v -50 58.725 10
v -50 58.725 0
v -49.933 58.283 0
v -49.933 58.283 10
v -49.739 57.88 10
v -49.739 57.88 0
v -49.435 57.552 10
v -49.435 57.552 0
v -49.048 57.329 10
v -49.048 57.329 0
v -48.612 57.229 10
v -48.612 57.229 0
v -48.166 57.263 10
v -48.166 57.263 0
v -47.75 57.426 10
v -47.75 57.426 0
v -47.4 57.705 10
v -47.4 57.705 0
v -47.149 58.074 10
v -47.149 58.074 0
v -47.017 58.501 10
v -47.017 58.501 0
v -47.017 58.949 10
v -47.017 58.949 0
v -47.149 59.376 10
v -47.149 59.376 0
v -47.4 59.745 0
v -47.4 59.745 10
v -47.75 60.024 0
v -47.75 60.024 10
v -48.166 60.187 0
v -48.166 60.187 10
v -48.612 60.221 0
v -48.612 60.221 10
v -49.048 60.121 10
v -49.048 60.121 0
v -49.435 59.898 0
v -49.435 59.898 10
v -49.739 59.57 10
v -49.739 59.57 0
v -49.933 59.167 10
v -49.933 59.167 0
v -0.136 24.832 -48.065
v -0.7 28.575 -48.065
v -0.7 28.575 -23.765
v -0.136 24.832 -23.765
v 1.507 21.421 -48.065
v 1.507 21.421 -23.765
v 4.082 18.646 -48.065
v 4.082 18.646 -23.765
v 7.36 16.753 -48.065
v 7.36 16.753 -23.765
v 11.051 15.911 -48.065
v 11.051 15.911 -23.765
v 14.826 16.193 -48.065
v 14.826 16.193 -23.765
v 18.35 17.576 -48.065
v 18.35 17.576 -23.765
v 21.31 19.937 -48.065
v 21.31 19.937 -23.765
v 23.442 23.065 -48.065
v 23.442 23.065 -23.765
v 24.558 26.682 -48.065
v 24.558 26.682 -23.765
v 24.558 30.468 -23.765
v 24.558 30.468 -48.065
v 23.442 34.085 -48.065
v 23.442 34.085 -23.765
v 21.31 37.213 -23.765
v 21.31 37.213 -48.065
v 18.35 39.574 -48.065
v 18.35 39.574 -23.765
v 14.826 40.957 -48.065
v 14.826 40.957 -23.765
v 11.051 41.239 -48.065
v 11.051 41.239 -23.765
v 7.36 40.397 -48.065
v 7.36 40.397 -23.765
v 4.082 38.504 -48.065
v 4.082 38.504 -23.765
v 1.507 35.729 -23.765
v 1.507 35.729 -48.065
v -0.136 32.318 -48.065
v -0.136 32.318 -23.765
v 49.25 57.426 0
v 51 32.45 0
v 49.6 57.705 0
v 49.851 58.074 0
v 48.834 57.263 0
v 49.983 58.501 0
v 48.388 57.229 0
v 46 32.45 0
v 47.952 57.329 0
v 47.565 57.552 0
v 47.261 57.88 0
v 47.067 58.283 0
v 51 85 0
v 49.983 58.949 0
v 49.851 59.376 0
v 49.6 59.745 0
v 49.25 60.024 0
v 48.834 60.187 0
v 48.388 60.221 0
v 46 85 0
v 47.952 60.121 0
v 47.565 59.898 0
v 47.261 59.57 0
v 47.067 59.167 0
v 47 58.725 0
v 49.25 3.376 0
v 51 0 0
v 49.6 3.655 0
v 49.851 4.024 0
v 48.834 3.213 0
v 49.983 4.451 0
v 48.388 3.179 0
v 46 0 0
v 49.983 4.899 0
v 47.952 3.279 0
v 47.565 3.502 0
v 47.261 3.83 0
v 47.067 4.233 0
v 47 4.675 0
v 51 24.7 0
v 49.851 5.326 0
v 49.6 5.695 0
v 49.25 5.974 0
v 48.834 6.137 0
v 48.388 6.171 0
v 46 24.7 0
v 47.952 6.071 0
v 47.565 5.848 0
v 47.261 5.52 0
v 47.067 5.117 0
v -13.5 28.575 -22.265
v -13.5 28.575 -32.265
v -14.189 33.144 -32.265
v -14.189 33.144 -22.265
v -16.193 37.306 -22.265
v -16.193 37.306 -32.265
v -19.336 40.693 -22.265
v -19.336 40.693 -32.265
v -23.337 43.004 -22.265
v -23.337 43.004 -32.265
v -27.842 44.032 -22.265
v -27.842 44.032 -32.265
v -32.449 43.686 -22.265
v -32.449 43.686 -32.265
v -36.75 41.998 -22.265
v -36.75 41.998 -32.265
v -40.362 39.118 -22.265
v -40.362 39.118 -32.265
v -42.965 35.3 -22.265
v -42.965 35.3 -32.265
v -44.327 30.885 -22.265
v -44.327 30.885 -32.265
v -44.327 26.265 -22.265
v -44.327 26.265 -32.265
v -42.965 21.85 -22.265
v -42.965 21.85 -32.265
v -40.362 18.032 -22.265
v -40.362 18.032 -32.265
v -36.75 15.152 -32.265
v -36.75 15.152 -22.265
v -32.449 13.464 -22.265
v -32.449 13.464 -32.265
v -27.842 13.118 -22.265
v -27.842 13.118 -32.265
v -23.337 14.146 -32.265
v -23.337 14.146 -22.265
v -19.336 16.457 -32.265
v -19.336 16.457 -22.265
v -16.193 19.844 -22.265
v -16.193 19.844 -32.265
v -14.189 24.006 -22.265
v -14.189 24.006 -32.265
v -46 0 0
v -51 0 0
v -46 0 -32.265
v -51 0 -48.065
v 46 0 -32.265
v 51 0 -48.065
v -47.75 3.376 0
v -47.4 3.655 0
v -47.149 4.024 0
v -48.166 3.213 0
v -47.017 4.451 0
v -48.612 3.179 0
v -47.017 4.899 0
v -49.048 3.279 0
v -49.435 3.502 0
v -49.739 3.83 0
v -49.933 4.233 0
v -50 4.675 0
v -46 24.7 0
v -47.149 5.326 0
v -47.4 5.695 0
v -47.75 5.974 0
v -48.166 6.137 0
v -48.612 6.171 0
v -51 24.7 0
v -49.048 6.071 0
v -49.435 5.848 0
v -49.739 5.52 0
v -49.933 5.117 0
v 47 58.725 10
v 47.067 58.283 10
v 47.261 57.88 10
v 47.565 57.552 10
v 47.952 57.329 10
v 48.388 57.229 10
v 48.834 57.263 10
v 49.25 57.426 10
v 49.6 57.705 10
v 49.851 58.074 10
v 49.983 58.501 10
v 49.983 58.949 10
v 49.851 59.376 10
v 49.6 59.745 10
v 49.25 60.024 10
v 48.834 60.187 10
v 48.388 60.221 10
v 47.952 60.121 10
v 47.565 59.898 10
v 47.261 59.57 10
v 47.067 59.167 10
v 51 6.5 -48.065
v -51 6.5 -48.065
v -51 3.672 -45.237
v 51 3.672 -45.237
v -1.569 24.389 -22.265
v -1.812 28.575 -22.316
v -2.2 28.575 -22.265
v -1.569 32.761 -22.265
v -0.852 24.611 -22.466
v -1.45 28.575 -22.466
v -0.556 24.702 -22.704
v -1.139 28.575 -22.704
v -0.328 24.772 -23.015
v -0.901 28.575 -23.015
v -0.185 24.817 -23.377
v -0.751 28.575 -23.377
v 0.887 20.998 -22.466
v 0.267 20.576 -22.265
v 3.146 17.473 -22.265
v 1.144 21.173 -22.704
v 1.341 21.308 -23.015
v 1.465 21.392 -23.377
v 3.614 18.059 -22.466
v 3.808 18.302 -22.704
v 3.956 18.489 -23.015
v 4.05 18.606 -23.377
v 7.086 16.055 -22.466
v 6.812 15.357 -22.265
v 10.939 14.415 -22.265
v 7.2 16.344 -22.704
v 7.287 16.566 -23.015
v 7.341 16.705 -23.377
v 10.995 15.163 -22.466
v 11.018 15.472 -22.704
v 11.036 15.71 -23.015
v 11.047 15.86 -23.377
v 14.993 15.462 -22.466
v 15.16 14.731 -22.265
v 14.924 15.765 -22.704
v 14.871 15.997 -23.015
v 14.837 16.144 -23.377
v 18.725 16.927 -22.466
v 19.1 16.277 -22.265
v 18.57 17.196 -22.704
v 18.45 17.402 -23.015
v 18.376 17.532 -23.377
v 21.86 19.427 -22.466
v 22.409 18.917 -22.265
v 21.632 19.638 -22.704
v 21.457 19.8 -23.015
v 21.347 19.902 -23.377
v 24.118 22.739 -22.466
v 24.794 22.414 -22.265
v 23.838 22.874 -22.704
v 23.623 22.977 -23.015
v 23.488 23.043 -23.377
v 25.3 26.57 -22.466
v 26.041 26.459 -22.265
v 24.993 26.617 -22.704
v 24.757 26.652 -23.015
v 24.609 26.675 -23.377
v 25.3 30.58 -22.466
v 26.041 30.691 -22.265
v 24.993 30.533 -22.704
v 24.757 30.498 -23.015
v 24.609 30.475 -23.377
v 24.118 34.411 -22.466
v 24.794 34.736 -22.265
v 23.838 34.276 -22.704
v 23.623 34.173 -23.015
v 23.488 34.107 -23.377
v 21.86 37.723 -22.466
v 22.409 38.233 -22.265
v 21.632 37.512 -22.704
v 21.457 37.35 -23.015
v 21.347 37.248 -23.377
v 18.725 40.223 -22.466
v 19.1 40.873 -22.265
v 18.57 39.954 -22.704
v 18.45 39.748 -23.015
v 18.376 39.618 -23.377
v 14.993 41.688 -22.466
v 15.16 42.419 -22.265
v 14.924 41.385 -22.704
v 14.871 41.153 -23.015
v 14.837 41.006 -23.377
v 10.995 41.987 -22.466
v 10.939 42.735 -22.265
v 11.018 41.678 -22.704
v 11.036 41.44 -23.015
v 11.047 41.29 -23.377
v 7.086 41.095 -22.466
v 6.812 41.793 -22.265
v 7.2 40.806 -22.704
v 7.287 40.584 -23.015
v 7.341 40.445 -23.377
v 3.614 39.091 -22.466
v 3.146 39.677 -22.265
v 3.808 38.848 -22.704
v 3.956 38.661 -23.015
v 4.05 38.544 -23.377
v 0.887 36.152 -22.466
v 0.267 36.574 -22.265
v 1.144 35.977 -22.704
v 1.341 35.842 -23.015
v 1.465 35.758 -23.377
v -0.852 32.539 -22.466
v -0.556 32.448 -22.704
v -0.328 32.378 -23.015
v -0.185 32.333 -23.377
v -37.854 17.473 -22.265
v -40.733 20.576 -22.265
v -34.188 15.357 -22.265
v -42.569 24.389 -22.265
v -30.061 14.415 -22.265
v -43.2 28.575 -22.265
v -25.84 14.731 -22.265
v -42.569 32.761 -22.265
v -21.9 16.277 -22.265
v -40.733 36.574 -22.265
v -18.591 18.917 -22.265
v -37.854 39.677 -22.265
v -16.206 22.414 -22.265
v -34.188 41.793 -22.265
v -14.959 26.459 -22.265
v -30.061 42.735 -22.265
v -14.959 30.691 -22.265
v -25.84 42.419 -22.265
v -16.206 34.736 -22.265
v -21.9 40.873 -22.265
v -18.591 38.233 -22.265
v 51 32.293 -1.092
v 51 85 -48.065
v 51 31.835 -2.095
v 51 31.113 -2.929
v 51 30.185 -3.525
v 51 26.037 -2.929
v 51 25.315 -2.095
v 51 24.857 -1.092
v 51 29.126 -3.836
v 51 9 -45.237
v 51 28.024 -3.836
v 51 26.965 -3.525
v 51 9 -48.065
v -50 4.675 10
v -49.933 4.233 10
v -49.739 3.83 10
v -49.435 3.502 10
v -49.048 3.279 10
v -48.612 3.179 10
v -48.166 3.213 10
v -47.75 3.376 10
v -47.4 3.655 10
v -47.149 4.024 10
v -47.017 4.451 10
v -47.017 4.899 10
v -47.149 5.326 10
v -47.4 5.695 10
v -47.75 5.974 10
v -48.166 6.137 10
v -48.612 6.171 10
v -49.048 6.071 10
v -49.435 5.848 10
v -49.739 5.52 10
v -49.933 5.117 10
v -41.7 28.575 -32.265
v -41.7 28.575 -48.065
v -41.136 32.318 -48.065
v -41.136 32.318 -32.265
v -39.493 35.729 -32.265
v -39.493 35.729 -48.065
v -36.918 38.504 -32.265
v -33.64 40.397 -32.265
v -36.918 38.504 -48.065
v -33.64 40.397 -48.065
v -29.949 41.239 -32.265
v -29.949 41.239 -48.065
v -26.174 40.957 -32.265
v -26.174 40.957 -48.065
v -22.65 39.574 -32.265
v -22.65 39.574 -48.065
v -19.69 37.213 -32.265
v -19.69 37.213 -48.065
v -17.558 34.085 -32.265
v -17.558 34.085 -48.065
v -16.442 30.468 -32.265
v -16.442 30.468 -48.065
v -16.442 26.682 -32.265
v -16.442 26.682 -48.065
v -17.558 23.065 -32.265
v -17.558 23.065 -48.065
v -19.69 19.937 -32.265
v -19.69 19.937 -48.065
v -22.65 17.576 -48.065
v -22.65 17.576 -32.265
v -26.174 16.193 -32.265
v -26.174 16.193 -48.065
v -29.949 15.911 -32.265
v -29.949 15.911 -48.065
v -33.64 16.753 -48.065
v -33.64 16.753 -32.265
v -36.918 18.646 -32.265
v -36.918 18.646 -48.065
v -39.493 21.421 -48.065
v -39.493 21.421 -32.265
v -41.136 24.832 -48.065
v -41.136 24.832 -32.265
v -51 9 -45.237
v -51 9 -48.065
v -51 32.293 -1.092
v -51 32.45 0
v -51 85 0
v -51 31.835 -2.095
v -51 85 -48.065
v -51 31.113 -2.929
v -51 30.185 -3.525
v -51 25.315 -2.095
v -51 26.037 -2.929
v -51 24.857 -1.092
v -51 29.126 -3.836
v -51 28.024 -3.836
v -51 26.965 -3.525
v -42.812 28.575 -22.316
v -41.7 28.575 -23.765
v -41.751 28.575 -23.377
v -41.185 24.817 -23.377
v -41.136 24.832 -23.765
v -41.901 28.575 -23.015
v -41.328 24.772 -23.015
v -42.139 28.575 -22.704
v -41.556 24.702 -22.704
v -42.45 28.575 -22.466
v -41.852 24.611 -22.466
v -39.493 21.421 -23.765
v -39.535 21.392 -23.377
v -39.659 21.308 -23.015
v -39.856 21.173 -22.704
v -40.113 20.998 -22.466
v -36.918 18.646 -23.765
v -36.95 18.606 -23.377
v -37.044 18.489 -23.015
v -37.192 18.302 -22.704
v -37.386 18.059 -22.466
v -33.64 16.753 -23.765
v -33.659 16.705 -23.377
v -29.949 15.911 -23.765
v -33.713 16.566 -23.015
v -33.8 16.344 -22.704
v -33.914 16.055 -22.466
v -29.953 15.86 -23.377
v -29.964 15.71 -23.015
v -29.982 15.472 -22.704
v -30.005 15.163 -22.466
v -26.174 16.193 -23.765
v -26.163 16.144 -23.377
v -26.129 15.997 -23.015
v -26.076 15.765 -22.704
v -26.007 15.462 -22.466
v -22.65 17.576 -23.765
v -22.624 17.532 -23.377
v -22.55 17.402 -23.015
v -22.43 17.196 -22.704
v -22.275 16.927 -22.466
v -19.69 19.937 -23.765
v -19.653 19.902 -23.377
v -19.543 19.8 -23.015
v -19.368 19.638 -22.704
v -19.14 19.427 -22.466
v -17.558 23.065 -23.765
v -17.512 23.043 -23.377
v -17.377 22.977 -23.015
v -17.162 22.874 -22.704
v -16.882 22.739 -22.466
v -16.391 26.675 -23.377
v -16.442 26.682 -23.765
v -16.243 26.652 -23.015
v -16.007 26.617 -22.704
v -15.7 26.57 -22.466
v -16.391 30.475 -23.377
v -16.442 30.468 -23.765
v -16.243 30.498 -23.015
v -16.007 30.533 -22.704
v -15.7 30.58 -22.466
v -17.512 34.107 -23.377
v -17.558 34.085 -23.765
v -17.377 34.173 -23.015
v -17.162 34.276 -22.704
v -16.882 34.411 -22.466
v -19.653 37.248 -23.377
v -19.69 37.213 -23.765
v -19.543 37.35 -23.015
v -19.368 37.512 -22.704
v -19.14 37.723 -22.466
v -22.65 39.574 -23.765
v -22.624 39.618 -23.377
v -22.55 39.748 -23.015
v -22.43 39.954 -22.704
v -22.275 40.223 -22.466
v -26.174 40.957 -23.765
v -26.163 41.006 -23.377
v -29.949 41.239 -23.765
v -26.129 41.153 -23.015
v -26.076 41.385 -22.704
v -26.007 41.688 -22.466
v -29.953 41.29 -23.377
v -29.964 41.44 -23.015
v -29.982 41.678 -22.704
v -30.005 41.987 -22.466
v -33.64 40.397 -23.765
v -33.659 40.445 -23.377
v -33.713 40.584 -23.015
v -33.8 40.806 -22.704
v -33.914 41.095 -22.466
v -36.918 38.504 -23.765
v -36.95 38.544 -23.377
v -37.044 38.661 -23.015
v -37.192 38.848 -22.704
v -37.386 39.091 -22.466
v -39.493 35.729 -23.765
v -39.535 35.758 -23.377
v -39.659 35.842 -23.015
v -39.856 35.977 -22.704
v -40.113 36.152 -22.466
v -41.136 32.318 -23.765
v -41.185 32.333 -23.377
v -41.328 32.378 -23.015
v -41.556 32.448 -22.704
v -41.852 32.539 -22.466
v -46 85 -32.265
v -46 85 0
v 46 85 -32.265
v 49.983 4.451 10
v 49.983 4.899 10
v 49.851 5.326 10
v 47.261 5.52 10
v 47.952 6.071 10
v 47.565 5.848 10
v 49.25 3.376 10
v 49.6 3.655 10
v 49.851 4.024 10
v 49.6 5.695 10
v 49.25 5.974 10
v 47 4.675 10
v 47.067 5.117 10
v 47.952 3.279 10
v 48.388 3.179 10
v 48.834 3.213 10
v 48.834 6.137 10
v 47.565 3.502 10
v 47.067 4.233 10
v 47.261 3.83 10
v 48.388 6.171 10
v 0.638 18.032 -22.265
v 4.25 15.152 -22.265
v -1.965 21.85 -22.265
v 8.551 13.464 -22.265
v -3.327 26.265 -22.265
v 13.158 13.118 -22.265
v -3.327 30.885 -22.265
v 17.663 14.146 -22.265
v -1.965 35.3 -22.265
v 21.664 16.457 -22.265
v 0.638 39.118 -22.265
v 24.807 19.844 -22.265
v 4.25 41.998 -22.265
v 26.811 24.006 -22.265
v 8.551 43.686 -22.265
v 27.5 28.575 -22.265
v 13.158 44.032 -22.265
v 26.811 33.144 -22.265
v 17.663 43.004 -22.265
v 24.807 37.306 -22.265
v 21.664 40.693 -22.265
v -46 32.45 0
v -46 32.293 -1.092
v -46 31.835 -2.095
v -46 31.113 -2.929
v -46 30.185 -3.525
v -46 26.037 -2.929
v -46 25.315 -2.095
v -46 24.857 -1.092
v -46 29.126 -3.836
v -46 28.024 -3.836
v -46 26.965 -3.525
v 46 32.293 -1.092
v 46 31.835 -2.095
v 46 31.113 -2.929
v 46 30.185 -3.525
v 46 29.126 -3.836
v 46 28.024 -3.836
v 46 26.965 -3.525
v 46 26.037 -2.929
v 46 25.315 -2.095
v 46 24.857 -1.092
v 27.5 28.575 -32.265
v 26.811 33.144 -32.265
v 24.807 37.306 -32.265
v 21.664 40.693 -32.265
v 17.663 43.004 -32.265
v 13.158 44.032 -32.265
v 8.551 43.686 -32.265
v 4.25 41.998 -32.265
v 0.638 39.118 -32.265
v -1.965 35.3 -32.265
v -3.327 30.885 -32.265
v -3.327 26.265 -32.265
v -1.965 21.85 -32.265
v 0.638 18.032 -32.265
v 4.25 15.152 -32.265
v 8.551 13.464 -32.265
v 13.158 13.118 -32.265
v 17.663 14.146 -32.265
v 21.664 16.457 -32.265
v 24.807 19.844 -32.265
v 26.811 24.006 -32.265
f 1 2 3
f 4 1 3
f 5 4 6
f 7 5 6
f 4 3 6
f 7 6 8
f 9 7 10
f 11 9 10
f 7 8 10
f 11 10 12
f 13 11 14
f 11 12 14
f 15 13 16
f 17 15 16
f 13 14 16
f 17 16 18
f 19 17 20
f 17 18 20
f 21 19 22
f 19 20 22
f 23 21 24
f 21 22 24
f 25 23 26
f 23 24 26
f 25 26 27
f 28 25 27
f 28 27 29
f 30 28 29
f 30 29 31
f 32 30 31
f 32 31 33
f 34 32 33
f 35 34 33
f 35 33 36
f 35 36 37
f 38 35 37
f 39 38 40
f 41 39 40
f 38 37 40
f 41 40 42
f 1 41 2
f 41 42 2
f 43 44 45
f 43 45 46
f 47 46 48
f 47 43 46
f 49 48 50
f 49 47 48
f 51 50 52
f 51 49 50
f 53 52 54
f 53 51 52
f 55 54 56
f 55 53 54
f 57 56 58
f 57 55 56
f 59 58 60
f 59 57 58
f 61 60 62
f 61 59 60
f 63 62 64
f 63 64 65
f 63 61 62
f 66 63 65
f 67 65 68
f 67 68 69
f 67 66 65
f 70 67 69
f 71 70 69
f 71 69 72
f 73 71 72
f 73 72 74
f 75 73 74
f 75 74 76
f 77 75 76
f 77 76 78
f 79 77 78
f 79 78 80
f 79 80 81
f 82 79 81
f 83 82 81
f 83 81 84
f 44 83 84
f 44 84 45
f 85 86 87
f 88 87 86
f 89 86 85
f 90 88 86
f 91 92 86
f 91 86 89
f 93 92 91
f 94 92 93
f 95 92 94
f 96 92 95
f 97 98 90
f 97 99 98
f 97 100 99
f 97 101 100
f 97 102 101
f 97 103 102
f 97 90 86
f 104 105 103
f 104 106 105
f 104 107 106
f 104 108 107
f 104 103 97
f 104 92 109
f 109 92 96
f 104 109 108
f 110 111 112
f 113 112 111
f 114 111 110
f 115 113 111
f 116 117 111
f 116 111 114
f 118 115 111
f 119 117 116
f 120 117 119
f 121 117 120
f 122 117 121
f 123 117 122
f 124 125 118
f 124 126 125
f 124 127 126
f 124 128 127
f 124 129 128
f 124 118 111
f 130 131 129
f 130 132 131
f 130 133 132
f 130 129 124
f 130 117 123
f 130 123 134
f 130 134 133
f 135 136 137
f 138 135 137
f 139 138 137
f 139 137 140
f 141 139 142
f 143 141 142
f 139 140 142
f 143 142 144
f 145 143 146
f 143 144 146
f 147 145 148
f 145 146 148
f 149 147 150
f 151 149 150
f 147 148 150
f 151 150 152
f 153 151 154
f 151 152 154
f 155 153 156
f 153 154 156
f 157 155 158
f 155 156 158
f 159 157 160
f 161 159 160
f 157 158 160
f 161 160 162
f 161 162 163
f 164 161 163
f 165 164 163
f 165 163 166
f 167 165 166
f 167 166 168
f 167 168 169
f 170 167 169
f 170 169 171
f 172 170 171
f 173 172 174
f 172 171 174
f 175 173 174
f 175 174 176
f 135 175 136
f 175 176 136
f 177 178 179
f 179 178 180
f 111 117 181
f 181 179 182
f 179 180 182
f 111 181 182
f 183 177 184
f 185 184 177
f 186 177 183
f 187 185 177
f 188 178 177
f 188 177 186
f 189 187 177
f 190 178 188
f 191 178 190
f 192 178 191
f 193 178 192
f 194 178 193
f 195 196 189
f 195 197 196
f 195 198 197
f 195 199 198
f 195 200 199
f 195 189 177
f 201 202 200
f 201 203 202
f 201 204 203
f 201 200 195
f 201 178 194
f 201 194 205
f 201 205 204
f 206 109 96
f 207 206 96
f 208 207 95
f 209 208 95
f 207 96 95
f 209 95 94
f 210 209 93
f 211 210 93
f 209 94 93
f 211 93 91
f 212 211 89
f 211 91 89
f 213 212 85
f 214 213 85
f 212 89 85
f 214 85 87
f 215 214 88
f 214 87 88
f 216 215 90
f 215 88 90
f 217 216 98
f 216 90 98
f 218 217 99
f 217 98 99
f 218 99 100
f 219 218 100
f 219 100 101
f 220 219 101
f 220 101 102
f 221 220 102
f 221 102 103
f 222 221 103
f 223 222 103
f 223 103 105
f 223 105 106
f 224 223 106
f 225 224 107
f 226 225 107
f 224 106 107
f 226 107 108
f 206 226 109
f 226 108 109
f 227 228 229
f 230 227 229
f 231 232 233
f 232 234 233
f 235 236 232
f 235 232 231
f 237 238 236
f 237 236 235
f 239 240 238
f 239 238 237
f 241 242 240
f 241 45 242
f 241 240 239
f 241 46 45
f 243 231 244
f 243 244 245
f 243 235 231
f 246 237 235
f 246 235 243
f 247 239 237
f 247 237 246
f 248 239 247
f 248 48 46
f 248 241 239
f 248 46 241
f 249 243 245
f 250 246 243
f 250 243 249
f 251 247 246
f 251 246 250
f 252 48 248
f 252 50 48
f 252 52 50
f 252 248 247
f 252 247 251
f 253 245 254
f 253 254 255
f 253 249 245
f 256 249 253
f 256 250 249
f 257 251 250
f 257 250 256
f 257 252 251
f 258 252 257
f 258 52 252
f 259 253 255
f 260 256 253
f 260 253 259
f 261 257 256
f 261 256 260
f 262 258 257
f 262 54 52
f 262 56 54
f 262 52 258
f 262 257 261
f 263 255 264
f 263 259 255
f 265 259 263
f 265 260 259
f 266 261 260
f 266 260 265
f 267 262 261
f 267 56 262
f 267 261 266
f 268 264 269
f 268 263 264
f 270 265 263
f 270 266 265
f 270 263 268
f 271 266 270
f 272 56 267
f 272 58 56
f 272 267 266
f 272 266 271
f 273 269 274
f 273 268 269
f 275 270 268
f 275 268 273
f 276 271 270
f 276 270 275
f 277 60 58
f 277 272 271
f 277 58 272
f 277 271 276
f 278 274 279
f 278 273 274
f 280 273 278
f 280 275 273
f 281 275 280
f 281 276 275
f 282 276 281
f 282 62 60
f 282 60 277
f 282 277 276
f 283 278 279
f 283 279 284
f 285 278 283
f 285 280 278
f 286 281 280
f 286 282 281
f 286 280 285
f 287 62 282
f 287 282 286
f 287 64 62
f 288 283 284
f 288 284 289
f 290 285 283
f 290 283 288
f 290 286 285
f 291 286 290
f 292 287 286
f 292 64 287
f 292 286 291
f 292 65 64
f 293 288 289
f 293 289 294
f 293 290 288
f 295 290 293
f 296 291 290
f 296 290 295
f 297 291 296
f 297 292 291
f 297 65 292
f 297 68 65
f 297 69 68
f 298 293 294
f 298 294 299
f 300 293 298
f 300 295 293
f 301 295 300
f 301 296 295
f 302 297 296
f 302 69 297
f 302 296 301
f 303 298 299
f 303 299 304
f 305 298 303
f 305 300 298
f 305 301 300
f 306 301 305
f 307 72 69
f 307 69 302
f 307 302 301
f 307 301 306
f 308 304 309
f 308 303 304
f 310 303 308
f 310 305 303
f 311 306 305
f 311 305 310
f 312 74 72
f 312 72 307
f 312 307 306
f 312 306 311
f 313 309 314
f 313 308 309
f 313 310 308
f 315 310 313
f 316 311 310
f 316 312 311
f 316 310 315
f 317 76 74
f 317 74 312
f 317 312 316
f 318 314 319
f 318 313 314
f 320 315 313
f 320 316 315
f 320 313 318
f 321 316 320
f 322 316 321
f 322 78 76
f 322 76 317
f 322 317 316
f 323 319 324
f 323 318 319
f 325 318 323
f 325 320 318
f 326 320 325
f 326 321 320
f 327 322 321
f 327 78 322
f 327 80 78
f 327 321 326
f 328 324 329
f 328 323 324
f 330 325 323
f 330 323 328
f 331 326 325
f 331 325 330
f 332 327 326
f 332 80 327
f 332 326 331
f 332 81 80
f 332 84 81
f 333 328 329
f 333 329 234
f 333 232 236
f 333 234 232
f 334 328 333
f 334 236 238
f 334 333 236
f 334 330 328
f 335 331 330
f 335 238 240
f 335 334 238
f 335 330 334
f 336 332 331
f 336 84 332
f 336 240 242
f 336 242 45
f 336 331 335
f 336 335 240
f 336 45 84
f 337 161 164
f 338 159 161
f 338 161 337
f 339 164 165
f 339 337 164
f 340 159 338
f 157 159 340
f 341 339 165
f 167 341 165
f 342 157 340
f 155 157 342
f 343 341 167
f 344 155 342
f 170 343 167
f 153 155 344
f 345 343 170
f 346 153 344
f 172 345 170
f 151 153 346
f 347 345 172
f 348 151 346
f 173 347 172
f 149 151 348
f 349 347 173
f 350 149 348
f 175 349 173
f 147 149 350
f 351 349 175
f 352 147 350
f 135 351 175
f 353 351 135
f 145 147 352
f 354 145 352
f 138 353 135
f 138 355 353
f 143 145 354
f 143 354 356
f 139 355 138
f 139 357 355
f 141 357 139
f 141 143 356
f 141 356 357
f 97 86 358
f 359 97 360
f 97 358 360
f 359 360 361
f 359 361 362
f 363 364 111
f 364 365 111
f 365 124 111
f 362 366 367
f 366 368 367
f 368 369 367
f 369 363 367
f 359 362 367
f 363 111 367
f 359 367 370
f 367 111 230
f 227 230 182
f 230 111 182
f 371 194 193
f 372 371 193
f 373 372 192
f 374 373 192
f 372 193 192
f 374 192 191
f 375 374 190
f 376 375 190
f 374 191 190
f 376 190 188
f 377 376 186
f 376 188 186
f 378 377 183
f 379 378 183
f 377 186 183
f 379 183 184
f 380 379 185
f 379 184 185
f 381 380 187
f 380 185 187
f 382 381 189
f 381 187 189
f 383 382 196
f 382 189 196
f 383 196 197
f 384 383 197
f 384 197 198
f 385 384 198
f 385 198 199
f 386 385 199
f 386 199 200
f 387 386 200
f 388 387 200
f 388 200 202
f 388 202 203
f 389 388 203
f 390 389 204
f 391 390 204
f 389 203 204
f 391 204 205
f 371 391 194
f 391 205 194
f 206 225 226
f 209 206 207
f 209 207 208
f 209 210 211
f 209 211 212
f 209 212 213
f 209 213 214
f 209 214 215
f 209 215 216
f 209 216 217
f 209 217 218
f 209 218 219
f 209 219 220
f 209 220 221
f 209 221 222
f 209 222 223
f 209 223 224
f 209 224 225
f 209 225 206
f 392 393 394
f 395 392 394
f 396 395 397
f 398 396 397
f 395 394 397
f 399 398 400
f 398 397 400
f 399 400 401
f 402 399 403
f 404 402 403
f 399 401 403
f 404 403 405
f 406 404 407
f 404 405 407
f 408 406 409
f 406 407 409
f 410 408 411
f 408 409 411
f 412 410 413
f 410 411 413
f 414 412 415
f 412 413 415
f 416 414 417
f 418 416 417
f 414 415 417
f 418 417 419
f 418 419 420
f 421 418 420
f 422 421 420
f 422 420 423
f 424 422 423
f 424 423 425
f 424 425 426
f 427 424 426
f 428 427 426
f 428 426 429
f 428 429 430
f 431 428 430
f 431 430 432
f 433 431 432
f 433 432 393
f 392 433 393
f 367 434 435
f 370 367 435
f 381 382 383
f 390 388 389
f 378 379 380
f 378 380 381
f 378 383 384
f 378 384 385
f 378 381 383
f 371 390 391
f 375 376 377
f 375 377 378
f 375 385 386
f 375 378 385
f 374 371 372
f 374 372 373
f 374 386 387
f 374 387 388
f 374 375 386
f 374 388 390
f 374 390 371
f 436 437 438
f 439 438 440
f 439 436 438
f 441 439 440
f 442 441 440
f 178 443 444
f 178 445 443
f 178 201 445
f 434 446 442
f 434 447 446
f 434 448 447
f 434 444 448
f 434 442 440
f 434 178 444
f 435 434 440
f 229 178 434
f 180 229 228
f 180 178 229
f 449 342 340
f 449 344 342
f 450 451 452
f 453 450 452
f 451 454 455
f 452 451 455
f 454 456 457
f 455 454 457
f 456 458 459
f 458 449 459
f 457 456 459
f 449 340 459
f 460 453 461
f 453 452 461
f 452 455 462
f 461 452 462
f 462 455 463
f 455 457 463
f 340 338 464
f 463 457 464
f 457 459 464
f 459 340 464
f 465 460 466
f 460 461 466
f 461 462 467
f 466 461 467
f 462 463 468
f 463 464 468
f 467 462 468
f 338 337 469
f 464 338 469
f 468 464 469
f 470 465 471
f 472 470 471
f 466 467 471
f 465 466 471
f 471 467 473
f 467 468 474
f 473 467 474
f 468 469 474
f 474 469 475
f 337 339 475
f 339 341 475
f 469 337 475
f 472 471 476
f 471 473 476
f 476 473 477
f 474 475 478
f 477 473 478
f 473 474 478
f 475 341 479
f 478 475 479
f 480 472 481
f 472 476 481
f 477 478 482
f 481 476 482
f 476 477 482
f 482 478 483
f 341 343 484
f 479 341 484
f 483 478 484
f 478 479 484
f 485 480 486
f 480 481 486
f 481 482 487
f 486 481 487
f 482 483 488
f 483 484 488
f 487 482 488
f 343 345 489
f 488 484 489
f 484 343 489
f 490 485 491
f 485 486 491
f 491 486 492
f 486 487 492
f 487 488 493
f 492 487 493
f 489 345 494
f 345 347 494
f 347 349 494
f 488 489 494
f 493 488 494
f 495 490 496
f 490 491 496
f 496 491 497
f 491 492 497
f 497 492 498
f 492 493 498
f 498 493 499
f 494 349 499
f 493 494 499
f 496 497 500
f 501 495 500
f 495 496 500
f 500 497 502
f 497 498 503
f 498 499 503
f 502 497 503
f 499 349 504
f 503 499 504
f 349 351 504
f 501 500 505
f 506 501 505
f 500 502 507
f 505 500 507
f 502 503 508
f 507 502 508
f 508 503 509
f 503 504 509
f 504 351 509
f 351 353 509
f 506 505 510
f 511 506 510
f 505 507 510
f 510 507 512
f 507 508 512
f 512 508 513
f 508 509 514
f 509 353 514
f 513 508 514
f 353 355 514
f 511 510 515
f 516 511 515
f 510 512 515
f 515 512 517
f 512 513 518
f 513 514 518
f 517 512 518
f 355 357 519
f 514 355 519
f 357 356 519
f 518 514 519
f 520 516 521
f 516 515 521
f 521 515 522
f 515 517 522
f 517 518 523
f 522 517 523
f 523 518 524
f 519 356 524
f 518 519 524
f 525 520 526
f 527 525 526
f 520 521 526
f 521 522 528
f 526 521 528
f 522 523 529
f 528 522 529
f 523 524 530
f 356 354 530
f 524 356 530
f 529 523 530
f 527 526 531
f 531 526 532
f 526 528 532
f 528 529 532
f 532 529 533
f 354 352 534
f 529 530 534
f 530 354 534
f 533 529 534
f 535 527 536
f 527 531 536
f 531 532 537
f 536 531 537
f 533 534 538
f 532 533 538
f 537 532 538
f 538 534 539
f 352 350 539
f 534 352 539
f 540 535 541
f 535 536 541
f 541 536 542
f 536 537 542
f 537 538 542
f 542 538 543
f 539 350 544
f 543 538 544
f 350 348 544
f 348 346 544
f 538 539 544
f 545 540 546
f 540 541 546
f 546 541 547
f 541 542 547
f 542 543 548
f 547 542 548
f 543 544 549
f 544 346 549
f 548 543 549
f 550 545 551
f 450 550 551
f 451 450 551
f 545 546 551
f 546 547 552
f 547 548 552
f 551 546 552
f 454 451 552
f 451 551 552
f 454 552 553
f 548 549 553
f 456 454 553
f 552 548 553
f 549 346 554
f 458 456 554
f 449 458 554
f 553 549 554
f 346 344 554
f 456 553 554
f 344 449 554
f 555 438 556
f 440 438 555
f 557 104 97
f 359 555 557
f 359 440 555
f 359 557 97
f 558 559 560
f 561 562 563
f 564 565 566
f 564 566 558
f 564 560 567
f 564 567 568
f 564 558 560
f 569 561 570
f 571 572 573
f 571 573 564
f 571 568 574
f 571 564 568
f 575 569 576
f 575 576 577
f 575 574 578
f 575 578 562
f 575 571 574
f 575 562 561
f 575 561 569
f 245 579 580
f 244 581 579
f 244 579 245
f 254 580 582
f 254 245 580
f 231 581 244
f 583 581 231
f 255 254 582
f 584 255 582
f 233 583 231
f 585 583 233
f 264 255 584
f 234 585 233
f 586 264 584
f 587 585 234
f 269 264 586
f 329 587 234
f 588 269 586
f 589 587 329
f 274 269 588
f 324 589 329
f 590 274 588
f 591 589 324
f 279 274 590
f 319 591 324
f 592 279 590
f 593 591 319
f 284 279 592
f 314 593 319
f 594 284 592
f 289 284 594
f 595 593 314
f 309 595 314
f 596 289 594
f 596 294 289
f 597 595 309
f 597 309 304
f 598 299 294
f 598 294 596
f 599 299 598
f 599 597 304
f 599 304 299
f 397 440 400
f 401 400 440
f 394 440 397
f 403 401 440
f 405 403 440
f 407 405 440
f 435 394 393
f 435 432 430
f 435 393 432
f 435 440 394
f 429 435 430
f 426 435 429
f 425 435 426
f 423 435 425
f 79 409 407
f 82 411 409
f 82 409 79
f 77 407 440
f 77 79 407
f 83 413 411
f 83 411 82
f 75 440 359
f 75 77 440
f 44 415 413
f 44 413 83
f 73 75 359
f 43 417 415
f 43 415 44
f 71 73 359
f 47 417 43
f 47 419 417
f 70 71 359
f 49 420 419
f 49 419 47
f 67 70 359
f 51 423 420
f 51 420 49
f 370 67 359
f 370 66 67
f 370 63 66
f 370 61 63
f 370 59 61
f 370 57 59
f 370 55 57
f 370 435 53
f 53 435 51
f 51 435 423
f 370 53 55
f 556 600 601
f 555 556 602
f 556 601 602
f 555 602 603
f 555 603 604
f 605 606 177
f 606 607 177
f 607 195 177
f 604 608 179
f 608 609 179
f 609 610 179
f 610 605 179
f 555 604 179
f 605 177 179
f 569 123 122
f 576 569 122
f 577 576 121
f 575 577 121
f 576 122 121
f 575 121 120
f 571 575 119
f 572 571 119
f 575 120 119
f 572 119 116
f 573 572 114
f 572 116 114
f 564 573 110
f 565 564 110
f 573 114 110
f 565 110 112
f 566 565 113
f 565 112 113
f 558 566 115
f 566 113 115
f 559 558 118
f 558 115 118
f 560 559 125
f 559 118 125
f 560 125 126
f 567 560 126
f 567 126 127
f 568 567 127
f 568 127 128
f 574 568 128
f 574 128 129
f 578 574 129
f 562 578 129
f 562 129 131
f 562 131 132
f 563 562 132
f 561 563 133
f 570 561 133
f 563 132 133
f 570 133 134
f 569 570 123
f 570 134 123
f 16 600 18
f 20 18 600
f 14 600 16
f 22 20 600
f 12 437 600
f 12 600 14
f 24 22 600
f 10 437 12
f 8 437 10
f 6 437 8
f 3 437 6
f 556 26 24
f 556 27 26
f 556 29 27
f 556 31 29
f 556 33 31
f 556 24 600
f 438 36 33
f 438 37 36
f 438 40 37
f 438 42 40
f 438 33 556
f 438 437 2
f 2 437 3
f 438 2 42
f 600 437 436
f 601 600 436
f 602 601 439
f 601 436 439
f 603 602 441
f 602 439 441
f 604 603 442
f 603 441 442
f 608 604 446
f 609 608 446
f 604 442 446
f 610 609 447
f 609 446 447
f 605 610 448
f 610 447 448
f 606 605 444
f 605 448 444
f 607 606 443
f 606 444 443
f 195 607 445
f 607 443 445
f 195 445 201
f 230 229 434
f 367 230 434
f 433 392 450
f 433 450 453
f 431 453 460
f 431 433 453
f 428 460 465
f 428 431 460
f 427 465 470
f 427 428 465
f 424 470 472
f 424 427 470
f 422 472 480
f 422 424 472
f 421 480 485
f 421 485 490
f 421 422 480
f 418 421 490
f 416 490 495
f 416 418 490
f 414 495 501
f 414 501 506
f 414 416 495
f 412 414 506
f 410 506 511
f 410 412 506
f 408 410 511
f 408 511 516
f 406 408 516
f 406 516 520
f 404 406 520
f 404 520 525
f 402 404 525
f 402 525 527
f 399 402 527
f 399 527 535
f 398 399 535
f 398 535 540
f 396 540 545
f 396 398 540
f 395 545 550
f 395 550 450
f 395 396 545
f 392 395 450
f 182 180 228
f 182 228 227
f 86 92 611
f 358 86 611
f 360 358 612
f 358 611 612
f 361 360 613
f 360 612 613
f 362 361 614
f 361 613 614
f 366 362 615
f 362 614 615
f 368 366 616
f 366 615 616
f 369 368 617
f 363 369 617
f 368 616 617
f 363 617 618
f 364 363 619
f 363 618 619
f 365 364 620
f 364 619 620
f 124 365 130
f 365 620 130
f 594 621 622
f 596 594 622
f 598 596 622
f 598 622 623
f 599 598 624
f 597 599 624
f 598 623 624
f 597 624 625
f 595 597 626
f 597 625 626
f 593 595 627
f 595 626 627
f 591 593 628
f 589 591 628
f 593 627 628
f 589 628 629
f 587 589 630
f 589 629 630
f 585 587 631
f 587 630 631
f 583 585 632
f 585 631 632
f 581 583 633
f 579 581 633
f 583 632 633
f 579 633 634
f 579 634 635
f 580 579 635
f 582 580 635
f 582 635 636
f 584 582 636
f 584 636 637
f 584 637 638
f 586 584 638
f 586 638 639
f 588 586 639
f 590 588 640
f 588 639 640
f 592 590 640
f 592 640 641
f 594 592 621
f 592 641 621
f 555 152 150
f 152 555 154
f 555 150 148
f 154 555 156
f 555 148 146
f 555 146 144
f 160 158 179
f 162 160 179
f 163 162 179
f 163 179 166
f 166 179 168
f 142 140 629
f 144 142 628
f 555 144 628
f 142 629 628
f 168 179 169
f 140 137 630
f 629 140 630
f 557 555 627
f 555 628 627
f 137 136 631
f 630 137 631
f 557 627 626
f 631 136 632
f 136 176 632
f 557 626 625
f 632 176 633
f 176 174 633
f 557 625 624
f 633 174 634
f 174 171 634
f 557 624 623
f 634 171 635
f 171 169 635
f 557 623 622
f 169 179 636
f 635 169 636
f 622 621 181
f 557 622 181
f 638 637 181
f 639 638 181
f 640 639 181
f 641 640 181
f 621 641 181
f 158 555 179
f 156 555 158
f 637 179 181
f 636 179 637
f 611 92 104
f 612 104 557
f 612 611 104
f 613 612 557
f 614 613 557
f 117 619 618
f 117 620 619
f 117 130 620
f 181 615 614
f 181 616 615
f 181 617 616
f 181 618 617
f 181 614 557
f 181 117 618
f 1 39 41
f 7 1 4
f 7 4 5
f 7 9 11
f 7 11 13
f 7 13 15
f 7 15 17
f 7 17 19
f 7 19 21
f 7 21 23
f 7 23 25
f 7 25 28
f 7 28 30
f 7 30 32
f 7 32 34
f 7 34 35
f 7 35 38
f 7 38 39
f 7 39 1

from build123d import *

# Parameters (mm, degrees)
SKETCH2_W           = 102
SKETCH2_H           = 96.13
SKETCH2_W_2         = 92
SKETCH2_H_2         = 64.53
BOSS_EXTRUDE1_DEPTH = 85
SKETCH8_R           = 10.25
CUT_EXTRUDE7_DEPTH  = 20
SKETCH9_R           = 12.7
CUT_EXTRUDE8_DEPTH  = 20
SKETCH10_R          = 3.875
CUT_EXTRUDE9_DEPTH  = 142.206388754
SKETCH11_W          = 48.065
SKETCH11_H          = 85
CUT_EXTRUDE10_DEPTH = 142.206388754
SKETCH14_R          = 1.5
BOSS_EXTRUDE2_DEPTH = 10
SKETCH15_R          = 15.5
SKETCH15_R_2        = 12.7
BOSS_EXTRUDE3_DEPTH = 10
FILLET1_R           = 1.5
CUT_EXTRUDE11_DEPTH = 142.206388754


with BuildPart() as part:
    # Sketch2 → Boss-Extrude1 (new body)
    with BuildSketch(Plane(origin=(0, 0, 0), x_dir=(1, 0, 0), z_dir=(0, 1, 0))):
        Rectangle(SKETCH2_W, SKETCH2_H)
        Rectangle(SKETCH2_W_2, SKETCH2_H_2, mode=Mode.SUBTRACT)
    extrude(amount=BOSS_EXTRUDE1_DEPTH)

    # Sketch8 → Cut-Extrude7 (cut)
    with BuildSketch(Plane.XY.offset(48.065)):
        with Locations((-31, 31.7)):
            Circle(SKETCH8_R)
        with Locations((29, 31.7)):
            Circle(SKETCH8_R)
    extrude(amount=-CUT_EXTRUDE7_DEPTH, mode=Mode.SUBTRACT)

    # Sketch9 → Cut-Extrude8 (cut)
    with BuildSketch(Plane(origin=(0, 0, -48.065), x_dir=(-1, 0, 0), z_dir=(0, 0, -1))):
        with Locations((-12, 28.575)):
            Circle(SKETCH9_R)
        with Locations((29, 28.575)):
            Circle(SKETCH9_R)
    extrude(amount=-CUT_EXTRUDE8_DEPTH, mode=Mode.SUBTRACT)

    # Sketch10 → Cut-Extrude9 (cut, through all)
    with BuildSketch(Plane.ZY.offset(51)):
        with Locations((0, 28.575)):
            Circle(SKETCH10_R)
    extrude(amount=-CUT_EXTRUDE9_DEPTH, mode=Mode.SUBTRACT)

    # Sketch11 → Cut-Extrude10 (cut, through all)
    with BuildSketch(Plane.ZY.offset(51)):
        with Locations((24.0325, 42.5)):
            Rectangle(SKETCH11_W, SKETCH11_H)
    extrude(amount=-CUT_EXTRUDE10_DEPTH, mode=Mode.SUBTRACT)

    # Sketch14 → Boss-Extrude2 (add)
    with BuildSketch(Plane.XY):
        with Locations(Location((-48.5, 58.725, 0), (0, 0, 180))):
            Circle(SKETCH14_R)
        with Locations(Location((-48.5, 4.675, 0), (0, 0, 180))):
            Circle(SKETCH14_R)
        with Locations(Location((48.5, 4.675, 0), (0, 0, 180))):
            Circle(SKETCH14_R)
        with Locations(Location((48.5, 58.725, 0), (0, 0, 180))):
            Circle(SKETCH14_R)
    extrude(amount=BOSS_EXTRUDE2_DEPTH)

    # Sketch15 → Boss-Extrude3 (add)
    # profile 1 of 2: a face of its own
    with BuildSketch(Plane.XY.offset(-32.265)):
        with Locations((12, 28.575)):
            Circle(SKETCH15_R)
        with Locations(Location((12, 28.575, 0), (0, 0, 180))):
            Circle(SKETCH15_R_2, mode=Mode.SUBTRACT)
    # profile 2 of 2: a face of its own
    with BuildSketch(Plane.XY.offset(-32.265)):
        with Locations((-29, 28.575)):
            Circle(SKETCH15_R)
        with Locations(Location((-29, 28.575, 0), (0, 0, 180))):
            Circle(SKETCH15_R_2, mode=Mode.SUBTRACT)
    extrude(amount=BOSS_EXTRUDE3_DEPTH)

    # Fillet1
    fillet1_edges = [part.edges().sort_by_distance(p)[0] for p in [
        (24.7, 28.575, -22.265),
        (-16.3, 28.575, -22.265),
    ]]
    fillet(fillet1_edges, radius=FILLET1_R)

    # Sketch16 → Cut-Extrude11 (cut, through all)
    with BuildSketch(Plane.ZY.offset(51)):
        Polygon((-48.065, 6.5), (-45.236572875, 3.671572875), (-45.236572875, 9), (-48.065, 9), align=None)
    extrude(amount=-CUT_EXTRUDE11_DEPTH, mode=Mode.SUBTRACT)


solid = part.part
